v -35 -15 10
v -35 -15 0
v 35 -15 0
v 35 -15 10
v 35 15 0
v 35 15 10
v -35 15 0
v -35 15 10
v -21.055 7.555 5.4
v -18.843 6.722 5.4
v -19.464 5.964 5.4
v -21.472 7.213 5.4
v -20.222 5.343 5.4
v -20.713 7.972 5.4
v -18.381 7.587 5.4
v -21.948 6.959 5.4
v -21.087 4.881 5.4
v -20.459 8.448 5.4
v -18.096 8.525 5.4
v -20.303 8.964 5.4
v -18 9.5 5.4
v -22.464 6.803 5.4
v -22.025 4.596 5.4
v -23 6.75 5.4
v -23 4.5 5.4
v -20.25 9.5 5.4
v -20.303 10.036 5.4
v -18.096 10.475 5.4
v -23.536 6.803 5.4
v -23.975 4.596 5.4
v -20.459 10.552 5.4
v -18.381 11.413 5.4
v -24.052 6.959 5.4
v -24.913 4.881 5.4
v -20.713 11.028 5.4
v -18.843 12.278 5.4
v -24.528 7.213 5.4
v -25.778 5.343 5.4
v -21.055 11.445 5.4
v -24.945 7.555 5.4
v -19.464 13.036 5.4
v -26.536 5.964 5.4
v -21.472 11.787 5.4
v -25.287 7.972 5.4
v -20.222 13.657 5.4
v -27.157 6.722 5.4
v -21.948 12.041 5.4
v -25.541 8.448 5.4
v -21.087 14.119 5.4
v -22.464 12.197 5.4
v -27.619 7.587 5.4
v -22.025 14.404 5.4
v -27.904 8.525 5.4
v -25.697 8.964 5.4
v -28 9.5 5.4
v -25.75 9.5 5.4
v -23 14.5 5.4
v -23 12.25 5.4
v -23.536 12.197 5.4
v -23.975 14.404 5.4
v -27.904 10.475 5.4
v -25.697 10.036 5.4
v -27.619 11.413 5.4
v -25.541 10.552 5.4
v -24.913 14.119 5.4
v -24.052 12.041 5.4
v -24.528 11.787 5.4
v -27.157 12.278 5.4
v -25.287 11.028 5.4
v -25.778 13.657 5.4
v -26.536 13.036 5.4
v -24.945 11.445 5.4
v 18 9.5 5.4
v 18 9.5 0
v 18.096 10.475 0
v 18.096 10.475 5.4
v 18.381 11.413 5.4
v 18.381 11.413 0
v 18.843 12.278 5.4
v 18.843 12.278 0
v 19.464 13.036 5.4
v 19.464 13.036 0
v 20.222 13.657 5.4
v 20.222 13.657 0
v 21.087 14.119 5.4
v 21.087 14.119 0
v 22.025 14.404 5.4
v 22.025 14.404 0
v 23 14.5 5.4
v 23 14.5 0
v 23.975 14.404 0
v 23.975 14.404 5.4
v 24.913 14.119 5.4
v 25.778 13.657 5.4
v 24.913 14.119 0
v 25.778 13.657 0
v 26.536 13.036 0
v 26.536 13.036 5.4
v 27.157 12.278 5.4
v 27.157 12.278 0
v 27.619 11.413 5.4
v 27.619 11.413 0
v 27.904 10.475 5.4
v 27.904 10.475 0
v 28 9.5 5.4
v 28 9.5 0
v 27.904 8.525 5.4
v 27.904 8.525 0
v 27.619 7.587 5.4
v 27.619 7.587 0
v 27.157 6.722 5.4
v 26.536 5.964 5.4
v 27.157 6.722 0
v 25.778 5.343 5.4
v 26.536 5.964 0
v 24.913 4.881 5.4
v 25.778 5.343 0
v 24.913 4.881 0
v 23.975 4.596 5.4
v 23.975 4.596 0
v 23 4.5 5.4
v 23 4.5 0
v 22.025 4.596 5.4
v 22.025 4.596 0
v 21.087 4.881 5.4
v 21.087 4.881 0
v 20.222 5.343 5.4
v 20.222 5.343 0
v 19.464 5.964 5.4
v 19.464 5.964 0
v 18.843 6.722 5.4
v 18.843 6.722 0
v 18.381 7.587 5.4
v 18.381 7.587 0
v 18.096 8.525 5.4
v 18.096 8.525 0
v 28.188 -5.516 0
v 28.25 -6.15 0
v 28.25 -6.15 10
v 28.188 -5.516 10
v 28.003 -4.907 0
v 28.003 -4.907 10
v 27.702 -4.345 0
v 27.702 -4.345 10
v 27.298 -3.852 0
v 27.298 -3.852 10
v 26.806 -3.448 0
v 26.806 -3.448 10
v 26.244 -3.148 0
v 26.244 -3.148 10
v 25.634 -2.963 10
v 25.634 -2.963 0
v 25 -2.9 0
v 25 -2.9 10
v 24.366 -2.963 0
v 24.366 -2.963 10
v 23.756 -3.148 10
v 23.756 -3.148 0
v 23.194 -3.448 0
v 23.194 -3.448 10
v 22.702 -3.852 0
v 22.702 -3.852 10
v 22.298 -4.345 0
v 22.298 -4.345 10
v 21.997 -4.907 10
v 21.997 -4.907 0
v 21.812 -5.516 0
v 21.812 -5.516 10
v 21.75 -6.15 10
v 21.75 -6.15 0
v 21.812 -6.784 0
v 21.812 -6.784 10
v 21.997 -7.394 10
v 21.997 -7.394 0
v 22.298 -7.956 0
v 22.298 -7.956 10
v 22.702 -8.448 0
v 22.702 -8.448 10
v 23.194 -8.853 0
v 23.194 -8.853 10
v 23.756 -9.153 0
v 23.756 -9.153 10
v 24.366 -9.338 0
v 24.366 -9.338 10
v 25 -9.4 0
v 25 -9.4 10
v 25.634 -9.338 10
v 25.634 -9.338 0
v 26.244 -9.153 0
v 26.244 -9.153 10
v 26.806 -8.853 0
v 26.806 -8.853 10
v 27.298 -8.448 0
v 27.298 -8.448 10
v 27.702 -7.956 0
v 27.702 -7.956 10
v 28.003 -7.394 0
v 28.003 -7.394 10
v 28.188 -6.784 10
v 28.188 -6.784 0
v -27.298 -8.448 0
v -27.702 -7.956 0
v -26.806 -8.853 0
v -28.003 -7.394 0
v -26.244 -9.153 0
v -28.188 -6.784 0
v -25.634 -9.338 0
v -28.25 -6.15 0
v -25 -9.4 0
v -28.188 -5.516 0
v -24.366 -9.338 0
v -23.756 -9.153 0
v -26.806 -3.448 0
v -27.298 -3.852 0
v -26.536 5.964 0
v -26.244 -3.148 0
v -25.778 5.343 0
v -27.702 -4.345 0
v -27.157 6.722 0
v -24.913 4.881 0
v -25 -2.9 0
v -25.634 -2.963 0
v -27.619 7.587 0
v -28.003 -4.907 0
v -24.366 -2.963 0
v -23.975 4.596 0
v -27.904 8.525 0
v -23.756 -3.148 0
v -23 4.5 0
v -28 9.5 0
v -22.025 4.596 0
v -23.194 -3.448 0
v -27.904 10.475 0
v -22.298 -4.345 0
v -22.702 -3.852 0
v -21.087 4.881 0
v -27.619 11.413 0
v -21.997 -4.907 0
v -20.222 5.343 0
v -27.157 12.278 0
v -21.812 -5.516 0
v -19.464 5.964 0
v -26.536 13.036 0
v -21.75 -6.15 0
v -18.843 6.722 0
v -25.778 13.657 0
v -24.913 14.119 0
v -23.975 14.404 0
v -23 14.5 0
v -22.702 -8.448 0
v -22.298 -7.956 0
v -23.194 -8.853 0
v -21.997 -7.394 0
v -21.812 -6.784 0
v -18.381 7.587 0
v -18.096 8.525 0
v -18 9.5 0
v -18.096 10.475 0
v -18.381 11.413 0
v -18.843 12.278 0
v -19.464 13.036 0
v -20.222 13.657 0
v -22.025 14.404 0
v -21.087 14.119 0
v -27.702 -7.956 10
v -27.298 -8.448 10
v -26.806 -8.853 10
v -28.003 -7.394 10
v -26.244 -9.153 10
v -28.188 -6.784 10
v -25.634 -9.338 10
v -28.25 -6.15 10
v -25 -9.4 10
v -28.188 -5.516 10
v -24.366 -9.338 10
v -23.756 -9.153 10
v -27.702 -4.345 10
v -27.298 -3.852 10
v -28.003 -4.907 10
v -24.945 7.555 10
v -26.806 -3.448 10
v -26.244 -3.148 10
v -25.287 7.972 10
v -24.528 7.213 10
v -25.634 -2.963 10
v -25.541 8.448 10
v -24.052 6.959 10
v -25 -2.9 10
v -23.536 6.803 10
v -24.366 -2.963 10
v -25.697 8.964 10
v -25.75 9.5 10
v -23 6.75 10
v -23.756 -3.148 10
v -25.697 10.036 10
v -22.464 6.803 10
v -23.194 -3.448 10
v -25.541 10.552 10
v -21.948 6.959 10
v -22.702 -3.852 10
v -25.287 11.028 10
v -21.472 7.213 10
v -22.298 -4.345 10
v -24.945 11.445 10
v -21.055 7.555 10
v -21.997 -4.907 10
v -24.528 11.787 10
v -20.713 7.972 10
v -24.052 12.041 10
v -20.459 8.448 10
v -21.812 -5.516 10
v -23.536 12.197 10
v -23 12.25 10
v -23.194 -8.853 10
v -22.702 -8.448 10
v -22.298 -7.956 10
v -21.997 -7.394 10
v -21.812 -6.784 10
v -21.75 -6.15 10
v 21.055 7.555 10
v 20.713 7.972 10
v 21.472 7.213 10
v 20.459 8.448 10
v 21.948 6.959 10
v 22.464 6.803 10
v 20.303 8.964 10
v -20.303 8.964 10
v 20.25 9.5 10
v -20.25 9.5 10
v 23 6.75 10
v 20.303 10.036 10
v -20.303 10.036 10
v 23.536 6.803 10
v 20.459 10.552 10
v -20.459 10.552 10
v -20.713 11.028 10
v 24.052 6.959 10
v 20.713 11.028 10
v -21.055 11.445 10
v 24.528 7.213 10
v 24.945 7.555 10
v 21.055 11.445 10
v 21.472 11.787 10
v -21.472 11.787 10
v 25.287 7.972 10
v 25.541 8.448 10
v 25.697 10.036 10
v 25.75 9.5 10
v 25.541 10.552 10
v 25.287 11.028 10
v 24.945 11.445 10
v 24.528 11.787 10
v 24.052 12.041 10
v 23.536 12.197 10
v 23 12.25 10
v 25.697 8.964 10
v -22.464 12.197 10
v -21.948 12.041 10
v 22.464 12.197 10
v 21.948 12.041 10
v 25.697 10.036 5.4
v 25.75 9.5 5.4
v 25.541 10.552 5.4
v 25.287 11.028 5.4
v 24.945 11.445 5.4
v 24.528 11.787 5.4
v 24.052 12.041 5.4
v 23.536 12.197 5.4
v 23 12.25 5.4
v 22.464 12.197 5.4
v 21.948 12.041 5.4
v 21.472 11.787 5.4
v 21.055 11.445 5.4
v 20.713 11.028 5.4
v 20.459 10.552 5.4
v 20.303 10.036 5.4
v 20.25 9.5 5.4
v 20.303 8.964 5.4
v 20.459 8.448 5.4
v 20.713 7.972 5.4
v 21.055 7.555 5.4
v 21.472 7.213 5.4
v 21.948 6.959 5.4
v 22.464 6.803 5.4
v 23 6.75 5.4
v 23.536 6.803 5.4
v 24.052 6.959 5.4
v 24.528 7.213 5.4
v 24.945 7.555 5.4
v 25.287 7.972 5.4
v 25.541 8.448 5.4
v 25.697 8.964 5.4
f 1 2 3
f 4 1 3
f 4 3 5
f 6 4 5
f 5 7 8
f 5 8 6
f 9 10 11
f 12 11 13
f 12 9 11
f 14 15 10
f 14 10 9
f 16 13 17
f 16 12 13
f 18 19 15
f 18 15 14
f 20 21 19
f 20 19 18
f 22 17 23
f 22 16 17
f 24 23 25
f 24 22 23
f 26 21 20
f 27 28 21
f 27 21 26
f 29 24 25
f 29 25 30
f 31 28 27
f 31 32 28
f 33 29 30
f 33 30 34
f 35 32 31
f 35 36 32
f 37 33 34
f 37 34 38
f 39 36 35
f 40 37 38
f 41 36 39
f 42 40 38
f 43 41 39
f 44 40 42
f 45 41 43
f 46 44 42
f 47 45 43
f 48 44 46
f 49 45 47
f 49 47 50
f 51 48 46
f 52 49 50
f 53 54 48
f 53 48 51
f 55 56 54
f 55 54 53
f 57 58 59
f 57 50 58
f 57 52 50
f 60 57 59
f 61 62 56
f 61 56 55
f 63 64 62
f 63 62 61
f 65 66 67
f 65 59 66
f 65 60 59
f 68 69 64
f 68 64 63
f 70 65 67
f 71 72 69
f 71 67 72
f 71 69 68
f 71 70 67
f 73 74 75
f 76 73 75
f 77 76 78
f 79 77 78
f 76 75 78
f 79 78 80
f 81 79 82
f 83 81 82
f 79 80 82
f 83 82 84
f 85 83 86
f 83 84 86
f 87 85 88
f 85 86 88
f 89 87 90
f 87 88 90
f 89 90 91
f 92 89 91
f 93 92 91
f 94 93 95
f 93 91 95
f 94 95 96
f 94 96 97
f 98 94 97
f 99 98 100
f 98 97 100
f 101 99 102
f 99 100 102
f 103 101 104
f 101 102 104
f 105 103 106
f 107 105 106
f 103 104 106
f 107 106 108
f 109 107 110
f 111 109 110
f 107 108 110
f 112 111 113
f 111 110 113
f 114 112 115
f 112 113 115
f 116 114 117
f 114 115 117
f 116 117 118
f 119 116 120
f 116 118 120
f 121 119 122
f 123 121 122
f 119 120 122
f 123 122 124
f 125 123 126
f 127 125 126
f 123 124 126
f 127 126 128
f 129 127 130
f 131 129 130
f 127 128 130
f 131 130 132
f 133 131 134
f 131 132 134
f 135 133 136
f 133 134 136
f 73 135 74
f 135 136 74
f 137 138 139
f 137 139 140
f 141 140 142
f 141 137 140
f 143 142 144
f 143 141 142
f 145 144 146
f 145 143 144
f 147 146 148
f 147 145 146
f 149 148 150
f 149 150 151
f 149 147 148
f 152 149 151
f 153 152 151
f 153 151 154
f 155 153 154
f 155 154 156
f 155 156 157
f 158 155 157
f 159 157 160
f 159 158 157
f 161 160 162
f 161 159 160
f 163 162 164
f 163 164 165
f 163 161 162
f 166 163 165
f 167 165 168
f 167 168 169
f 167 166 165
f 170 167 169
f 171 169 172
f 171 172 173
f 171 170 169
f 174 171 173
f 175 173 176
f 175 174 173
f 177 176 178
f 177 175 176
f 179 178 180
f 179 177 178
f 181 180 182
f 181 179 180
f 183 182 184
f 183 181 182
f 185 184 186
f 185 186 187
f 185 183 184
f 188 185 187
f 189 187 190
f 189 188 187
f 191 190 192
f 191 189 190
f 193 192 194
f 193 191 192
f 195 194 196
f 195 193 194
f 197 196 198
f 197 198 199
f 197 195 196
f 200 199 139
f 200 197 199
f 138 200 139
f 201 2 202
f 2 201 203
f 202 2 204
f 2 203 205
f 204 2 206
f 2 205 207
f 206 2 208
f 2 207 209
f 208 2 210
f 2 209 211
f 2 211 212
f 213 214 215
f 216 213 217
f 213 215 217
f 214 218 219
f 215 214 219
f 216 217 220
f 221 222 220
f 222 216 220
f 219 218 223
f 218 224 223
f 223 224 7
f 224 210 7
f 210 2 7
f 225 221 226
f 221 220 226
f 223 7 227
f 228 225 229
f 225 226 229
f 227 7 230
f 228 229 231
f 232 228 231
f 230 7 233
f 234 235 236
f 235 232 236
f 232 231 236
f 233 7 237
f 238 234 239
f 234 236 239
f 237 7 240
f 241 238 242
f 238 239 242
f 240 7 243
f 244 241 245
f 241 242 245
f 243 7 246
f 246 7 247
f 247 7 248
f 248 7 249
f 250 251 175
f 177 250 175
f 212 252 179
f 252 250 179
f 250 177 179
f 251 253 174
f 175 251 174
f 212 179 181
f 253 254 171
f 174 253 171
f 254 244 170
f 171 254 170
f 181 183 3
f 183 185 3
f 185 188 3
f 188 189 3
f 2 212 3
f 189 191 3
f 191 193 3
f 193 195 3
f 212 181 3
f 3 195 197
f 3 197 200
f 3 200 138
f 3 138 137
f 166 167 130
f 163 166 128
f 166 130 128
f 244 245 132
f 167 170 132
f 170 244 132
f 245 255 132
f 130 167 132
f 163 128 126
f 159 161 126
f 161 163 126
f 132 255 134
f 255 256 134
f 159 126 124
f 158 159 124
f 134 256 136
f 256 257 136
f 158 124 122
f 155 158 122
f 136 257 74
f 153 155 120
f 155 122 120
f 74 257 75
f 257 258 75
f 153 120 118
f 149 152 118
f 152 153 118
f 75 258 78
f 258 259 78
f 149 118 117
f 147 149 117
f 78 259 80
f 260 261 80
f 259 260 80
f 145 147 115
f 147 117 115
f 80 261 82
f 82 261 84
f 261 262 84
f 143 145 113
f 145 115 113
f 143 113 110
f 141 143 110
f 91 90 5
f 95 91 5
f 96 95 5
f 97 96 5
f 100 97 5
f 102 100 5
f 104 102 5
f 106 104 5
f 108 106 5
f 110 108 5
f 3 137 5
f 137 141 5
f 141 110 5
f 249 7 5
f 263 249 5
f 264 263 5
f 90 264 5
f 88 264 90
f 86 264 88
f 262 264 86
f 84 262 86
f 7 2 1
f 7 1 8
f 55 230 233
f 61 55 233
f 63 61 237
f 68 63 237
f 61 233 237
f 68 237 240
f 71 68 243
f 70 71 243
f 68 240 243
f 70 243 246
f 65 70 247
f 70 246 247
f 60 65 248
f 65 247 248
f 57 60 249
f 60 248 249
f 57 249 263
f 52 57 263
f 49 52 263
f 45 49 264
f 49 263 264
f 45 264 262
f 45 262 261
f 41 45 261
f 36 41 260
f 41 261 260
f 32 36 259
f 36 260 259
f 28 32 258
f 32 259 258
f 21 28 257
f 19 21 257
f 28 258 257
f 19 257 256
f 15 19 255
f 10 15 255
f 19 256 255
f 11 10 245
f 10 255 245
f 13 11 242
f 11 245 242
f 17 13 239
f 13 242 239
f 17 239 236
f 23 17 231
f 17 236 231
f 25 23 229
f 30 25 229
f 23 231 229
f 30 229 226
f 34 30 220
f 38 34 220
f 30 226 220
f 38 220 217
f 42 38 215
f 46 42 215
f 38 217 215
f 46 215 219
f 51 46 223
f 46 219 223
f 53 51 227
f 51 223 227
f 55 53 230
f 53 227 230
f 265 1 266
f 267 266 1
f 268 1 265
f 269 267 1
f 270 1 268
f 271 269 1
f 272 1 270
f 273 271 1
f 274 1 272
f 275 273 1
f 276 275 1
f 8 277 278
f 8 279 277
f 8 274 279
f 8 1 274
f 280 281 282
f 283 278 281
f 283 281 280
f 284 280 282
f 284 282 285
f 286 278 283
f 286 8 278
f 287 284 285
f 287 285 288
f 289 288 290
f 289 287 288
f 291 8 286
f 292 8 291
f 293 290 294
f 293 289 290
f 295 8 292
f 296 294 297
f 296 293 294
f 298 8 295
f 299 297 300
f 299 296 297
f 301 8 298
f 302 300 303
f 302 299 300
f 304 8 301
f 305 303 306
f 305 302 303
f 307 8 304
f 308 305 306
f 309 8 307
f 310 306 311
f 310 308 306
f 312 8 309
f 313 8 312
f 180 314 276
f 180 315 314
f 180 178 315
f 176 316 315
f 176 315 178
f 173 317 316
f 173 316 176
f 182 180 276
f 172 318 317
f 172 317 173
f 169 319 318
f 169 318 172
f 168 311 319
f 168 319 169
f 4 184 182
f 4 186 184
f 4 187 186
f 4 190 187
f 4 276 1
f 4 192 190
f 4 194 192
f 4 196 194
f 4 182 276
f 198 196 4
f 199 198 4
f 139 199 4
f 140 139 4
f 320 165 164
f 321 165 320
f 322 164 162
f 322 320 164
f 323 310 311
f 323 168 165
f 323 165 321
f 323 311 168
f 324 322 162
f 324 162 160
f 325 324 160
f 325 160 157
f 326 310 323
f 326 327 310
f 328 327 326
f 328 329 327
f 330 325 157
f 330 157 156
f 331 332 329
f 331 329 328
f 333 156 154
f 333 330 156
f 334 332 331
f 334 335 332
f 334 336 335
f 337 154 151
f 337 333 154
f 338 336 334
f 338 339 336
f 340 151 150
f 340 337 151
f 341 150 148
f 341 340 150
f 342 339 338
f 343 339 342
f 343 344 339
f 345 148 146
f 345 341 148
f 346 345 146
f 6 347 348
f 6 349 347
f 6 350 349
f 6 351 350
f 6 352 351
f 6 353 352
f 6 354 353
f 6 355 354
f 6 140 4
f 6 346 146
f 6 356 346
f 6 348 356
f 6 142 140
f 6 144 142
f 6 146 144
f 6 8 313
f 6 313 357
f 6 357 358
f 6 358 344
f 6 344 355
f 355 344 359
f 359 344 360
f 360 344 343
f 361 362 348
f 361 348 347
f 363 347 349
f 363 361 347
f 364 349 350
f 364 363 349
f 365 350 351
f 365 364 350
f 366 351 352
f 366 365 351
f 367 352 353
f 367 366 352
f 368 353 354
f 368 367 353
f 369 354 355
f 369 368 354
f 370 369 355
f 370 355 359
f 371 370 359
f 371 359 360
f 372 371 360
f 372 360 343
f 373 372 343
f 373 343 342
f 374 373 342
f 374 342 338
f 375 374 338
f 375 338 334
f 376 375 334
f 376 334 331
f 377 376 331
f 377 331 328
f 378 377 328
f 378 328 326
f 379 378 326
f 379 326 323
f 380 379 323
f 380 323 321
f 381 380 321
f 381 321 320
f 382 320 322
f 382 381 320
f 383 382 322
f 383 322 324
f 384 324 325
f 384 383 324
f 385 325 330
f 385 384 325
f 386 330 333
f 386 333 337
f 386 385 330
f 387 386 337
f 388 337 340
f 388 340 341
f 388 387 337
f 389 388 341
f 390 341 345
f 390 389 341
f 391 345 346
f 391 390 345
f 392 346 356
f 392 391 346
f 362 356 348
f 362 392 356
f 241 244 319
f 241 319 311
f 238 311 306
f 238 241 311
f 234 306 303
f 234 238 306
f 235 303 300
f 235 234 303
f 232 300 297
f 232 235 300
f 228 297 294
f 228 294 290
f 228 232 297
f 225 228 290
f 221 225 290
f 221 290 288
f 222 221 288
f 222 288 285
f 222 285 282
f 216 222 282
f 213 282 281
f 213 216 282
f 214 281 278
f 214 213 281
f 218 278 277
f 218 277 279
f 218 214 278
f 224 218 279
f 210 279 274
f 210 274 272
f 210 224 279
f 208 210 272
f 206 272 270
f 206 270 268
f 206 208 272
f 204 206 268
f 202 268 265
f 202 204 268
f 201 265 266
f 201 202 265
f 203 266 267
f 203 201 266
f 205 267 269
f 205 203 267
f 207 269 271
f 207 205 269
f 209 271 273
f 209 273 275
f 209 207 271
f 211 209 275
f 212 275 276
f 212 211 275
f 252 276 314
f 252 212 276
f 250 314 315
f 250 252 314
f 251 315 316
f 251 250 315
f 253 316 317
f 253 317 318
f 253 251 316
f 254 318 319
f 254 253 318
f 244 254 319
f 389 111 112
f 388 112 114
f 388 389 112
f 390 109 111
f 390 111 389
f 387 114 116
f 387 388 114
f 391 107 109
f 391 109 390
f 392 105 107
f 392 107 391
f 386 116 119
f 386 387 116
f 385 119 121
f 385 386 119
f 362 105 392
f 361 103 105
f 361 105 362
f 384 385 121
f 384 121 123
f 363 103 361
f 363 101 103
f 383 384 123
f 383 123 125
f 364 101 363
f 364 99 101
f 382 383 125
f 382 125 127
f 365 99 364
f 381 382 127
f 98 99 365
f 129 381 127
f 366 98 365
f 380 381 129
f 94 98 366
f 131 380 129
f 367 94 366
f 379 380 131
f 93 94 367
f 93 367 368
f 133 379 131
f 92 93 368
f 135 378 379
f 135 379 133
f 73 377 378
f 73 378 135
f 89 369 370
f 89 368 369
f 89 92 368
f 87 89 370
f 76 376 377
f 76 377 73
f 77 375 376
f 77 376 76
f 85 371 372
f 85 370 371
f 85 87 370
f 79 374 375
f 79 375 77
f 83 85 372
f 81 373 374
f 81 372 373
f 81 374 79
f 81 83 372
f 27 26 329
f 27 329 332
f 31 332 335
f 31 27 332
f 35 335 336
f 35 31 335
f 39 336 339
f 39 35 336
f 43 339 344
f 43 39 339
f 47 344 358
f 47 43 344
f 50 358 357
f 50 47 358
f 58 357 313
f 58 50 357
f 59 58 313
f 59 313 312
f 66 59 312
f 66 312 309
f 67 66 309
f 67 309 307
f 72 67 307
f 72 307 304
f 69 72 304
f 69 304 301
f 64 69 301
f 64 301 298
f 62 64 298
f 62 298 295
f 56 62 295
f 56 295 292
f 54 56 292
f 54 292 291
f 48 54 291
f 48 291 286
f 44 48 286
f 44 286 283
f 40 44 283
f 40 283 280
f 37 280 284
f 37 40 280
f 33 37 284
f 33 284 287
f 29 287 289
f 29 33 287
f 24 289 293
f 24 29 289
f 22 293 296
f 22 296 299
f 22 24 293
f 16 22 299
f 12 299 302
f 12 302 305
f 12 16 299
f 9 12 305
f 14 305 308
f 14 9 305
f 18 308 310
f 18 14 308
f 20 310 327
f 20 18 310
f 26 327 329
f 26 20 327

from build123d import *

# Parameters (mm, degrees)
SKETCH1_W           = 70
SKETCH1_H           = 30
SKETCH1_R           = 3.25
SKETCH1_R_2         = 2.75
BOSS_EXTRUDE1_DEPTH = 10
SKETCH3_R           = 5
CUT_EXTRUDE1_DEPTH  = 5.4


with BuildPart() as part:
    # Sketch1 → Boss-Extrude1 (new body)
    with BuildSketch(Plane.XY):
        Rectangle(SKETCH1_W, SKETCH1_H)
        with Locations((-25, -6.150362319)):
            Circle(SKETCH1_R, mode=Mode.SUBTRACT)
        with Locations((25, -6.150362319)):
            Circle(SKETCH1_R, mode=Mode.SUBTRACT)
        with Locations((-23, 9.5)):
            Circle(SKETCH1_R_2, mode=Mode.SUBTRACT)
        with Locations((23, 9.5)):
            Circle(SKETCH1_R_2, mode=Mode.SUBTRACT)
    extrude(amount=BOSS_EXTRUDE1_DEPTH)

    # Sketch3 → Cut-Extrude1 (cut)
    with BuildSketch(Plane(origin=(0, 0, 0), x_dir=(-1, 0, 0), z_dir=(0, 0, -1))):
        with Locations((-23, 9.5)):
            Circle(SKETCH3_R)
        with Locations((23, 9.5)):
            Circle(SKETCH3_R)
    extrude(amount=-CUT_EXTRUDE1_DEPTH, mode=Mode.SUBTRACT)


solid = part.part
